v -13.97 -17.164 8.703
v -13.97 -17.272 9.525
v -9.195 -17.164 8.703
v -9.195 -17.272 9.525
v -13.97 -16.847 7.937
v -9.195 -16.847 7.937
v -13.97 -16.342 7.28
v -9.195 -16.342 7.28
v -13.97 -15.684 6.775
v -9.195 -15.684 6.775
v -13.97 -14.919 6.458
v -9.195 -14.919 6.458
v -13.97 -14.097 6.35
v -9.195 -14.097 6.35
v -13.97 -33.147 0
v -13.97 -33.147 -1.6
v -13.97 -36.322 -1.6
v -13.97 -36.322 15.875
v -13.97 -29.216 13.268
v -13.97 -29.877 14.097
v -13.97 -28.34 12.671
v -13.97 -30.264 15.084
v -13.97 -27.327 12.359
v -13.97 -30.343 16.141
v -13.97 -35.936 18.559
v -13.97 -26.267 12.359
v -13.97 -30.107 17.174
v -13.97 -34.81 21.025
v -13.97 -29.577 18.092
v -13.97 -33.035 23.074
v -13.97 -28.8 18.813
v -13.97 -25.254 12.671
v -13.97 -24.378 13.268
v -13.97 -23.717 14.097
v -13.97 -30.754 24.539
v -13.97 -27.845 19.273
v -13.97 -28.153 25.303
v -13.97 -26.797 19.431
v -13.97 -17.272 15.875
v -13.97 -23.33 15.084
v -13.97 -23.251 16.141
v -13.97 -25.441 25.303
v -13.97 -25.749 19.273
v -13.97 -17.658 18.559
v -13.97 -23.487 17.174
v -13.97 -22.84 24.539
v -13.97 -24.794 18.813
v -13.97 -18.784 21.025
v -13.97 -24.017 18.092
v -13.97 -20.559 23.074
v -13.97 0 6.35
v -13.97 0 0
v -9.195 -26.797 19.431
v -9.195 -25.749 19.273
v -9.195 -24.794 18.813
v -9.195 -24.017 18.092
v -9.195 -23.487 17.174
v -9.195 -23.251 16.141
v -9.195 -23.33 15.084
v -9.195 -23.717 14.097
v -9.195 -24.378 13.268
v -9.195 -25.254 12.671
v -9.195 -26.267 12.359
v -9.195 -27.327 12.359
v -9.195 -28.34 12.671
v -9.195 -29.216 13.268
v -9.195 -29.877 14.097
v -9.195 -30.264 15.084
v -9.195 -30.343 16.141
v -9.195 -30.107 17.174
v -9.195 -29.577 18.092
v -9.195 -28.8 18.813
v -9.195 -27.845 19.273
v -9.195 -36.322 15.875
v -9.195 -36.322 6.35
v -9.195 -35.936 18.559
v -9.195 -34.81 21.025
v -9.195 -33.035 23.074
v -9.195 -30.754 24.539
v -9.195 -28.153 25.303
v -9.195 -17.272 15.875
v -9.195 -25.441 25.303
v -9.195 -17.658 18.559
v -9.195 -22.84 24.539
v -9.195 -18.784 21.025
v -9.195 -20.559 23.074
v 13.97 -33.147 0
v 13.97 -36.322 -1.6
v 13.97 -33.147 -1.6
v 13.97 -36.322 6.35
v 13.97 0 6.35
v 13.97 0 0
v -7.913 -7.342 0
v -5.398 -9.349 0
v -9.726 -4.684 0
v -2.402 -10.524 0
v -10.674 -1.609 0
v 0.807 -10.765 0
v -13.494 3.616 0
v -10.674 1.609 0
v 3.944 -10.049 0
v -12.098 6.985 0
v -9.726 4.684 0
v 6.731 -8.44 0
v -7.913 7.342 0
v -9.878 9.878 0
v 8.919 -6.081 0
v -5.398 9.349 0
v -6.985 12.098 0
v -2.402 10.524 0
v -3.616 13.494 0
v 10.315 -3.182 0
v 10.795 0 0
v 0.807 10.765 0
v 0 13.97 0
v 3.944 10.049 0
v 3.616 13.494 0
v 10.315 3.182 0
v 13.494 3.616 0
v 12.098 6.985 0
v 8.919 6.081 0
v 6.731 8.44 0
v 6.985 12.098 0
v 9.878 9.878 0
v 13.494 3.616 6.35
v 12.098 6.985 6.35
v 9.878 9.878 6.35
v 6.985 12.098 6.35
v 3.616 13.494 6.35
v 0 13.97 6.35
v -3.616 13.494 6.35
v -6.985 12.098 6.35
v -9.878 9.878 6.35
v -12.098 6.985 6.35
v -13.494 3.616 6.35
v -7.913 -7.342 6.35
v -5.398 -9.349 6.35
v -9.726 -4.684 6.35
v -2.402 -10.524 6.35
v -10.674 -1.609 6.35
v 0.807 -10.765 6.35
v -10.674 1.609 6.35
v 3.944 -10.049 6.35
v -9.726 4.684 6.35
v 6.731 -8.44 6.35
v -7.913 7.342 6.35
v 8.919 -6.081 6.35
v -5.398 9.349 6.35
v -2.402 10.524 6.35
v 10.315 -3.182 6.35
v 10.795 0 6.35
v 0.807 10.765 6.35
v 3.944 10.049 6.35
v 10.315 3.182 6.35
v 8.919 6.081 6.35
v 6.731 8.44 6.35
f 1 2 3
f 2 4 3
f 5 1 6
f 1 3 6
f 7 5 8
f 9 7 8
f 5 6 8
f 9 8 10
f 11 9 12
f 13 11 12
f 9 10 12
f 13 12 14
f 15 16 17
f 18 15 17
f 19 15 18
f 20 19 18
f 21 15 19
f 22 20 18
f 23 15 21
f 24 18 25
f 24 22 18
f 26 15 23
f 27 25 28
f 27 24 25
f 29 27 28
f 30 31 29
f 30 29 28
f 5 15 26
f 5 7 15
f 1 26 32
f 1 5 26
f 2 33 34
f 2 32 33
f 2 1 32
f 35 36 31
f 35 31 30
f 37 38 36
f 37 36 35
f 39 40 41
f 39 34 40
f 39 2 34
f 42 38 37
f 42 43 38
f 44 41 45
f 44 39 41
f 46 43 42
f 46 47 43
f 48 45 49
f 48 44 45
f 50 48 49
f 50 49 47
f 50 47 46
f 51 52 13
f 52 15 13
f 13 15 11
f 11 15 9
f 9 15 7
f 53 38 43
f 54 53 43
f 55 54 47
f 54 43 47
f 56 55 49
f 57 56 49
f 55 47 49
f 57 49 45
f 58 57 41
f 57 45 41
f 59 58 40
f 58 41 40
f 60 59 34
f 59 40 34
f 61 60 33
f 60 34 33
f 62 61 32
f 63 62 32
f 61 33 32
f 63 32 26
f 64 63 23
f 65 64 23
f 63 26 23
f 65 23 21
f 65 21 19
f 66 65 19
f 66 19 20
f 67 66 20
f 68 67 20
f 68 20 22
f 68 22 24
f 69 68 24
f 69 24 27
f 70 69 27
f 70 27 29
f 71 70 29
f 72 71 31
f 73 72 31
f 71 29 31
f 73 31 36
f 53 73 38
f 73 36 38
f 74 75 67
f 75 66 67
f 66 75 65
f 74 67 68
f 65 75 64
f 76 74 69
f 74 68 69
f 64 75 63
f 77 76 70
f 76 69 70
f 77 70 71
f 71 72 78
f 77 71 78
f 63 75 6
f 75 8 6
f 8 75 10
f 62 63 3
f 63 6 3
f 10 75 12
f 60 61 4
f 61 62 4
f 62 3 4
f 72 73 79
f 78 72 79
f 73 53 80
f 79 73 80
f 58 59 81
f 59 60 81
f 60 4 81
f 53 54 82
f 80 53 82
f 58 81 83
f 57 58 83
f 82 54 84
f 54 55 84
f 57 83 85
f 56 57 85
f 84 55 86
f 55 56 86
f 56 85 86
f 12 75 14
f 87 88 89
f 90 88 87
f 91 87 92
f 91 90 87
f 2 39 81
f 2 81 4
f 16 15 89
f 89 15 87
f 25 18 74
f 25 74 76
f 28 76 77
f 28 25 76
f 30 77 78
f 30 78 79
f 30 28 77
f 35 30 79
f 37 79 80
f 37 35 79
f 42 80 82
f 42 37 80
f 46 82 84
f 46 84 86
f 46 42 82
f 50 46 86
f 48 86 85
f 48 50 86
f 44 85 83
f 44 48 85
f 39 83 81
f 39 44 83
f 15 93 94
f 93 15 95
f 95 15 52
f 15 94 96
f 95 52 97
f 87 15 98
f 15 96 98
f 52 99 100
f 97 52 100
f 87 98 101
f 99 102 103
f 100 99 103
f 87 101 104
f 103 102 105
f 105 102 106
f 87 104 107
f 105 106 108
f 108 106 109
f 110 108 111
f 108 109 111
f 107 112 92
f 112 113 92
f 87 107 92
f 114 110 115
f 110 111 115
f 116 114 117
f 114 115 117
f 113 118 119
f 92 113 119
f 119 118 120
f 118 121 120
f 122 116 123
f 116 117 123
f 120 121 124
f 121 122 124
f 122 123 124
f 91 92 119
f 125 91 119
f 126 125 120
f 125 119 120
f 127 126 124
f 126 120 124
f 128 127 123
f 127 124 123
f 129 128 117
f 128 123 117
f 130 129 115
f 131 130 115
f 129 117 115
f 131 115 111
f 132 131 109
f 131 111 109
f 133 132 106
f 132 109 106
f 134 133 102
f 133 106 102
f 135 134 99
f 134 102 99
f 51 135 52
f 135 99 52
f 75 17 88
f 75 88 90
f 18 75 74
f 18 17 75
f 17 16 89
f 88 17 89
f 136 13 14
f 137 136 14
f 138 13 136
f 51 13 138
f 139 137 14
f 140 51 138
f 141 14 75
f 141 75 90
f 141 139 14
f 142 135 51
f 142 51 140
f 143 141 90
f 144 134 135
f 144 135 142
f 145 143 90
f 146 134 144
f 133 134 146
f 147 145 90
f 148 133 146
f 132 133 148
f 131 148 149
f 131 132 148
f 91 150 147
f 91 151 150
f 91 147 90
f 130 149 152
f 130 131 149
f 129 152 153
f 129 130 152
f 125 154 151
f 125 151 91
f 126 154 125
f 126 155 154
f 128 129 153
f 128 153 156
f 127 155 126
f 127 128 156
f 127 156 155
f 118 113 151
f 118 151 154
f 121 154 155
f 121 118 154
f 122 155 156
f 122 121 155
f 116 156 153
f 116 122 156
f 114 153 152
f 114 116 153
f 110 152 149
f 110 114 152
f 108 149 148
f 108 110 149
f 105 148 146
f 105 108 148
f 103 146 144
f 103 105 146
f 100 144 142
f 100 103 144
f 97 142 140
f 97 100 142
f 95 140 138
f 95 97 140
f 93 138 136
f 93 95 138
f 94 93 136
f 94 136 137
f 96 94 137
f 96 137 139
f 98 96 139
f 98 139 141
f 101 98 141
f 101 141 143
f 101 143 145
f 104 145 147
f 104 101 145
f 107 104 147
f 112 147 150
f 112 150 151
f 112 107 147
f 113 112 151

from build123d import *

# Parameters (mm, degrees)
SKETCH2_R           = 10.795
BOSS_EXTRUDE1_DEPTH = 6.35
SKETCH4_W           = 27.94
SKETCH4_H           = 3.175
BOSS_EXTRUDE2_DEPTH = 7.9502
SKETCH5_R           = 3.556
BOSS_EXTRUDE3_DEPTH = 4.7752
FILLET2_R           = 3.175


with BuildPart() as part:
    # Sketch2 → Boss-Extrude1 (new body)
    with BuildSketch(Plane.XY):
        with BuildLine():
            Line((-13.97, 0), (-13.97, -33.147))
            Line((-13.97, -33.147), (13.97, -33.147))
            Line((13.97, -33.147), (13.97, 0))
            ThreePointArc((13.97, 0), (0, 13.97), (-13.97, 0))
        make_face()
        Circle(SKETCH2_R, mode=Mode.SUBTRACT)
    extrude(amount=BOSS_EXTRUDE1_DEPTH)

    # Sketch4 → Boss-Extrude2 (add)
    with BuildSketch(Plane.XY.offset(6.35)):
        with Locations((0, -34.7345)):
            Rectangle(SKETCH4_W, SKETCH4_H)
    extrude(amount=-BOSS_EXTRUDE2_DEPTH)

    # Sketch5 → Boss-Extrude3 (add)
    with BuildSketch(Plane.ZY.offset(13.97)):
        with BuildLine():
            Line((6.35, -36.322), (15.875, -36.322))
            ThreePointArc((15.875, -36.322), (25.4, -26.797), (15.875, -17.272))
            Line((15.875, -17.272), (6.35, -17.272))
            Line((6.35, -17.272), (6.35, -36.322))
        make_face()
        with Locations((15.875, -26.797)):
            Circle(SKETCH5_R, mode=Mode.SUBTRACT)
    extrude(amount=-BOSS_EXTRUDE3_DEPTH)

    # Fillet2
    fillet2_edges = [part.edges().sort_by_distance(p)[0] for p in [
        (-11.5824, -17.272, 6.35),
    ]]
    fillet(fillet2_edges, radius=FILLET2_R)


solid = part.part
